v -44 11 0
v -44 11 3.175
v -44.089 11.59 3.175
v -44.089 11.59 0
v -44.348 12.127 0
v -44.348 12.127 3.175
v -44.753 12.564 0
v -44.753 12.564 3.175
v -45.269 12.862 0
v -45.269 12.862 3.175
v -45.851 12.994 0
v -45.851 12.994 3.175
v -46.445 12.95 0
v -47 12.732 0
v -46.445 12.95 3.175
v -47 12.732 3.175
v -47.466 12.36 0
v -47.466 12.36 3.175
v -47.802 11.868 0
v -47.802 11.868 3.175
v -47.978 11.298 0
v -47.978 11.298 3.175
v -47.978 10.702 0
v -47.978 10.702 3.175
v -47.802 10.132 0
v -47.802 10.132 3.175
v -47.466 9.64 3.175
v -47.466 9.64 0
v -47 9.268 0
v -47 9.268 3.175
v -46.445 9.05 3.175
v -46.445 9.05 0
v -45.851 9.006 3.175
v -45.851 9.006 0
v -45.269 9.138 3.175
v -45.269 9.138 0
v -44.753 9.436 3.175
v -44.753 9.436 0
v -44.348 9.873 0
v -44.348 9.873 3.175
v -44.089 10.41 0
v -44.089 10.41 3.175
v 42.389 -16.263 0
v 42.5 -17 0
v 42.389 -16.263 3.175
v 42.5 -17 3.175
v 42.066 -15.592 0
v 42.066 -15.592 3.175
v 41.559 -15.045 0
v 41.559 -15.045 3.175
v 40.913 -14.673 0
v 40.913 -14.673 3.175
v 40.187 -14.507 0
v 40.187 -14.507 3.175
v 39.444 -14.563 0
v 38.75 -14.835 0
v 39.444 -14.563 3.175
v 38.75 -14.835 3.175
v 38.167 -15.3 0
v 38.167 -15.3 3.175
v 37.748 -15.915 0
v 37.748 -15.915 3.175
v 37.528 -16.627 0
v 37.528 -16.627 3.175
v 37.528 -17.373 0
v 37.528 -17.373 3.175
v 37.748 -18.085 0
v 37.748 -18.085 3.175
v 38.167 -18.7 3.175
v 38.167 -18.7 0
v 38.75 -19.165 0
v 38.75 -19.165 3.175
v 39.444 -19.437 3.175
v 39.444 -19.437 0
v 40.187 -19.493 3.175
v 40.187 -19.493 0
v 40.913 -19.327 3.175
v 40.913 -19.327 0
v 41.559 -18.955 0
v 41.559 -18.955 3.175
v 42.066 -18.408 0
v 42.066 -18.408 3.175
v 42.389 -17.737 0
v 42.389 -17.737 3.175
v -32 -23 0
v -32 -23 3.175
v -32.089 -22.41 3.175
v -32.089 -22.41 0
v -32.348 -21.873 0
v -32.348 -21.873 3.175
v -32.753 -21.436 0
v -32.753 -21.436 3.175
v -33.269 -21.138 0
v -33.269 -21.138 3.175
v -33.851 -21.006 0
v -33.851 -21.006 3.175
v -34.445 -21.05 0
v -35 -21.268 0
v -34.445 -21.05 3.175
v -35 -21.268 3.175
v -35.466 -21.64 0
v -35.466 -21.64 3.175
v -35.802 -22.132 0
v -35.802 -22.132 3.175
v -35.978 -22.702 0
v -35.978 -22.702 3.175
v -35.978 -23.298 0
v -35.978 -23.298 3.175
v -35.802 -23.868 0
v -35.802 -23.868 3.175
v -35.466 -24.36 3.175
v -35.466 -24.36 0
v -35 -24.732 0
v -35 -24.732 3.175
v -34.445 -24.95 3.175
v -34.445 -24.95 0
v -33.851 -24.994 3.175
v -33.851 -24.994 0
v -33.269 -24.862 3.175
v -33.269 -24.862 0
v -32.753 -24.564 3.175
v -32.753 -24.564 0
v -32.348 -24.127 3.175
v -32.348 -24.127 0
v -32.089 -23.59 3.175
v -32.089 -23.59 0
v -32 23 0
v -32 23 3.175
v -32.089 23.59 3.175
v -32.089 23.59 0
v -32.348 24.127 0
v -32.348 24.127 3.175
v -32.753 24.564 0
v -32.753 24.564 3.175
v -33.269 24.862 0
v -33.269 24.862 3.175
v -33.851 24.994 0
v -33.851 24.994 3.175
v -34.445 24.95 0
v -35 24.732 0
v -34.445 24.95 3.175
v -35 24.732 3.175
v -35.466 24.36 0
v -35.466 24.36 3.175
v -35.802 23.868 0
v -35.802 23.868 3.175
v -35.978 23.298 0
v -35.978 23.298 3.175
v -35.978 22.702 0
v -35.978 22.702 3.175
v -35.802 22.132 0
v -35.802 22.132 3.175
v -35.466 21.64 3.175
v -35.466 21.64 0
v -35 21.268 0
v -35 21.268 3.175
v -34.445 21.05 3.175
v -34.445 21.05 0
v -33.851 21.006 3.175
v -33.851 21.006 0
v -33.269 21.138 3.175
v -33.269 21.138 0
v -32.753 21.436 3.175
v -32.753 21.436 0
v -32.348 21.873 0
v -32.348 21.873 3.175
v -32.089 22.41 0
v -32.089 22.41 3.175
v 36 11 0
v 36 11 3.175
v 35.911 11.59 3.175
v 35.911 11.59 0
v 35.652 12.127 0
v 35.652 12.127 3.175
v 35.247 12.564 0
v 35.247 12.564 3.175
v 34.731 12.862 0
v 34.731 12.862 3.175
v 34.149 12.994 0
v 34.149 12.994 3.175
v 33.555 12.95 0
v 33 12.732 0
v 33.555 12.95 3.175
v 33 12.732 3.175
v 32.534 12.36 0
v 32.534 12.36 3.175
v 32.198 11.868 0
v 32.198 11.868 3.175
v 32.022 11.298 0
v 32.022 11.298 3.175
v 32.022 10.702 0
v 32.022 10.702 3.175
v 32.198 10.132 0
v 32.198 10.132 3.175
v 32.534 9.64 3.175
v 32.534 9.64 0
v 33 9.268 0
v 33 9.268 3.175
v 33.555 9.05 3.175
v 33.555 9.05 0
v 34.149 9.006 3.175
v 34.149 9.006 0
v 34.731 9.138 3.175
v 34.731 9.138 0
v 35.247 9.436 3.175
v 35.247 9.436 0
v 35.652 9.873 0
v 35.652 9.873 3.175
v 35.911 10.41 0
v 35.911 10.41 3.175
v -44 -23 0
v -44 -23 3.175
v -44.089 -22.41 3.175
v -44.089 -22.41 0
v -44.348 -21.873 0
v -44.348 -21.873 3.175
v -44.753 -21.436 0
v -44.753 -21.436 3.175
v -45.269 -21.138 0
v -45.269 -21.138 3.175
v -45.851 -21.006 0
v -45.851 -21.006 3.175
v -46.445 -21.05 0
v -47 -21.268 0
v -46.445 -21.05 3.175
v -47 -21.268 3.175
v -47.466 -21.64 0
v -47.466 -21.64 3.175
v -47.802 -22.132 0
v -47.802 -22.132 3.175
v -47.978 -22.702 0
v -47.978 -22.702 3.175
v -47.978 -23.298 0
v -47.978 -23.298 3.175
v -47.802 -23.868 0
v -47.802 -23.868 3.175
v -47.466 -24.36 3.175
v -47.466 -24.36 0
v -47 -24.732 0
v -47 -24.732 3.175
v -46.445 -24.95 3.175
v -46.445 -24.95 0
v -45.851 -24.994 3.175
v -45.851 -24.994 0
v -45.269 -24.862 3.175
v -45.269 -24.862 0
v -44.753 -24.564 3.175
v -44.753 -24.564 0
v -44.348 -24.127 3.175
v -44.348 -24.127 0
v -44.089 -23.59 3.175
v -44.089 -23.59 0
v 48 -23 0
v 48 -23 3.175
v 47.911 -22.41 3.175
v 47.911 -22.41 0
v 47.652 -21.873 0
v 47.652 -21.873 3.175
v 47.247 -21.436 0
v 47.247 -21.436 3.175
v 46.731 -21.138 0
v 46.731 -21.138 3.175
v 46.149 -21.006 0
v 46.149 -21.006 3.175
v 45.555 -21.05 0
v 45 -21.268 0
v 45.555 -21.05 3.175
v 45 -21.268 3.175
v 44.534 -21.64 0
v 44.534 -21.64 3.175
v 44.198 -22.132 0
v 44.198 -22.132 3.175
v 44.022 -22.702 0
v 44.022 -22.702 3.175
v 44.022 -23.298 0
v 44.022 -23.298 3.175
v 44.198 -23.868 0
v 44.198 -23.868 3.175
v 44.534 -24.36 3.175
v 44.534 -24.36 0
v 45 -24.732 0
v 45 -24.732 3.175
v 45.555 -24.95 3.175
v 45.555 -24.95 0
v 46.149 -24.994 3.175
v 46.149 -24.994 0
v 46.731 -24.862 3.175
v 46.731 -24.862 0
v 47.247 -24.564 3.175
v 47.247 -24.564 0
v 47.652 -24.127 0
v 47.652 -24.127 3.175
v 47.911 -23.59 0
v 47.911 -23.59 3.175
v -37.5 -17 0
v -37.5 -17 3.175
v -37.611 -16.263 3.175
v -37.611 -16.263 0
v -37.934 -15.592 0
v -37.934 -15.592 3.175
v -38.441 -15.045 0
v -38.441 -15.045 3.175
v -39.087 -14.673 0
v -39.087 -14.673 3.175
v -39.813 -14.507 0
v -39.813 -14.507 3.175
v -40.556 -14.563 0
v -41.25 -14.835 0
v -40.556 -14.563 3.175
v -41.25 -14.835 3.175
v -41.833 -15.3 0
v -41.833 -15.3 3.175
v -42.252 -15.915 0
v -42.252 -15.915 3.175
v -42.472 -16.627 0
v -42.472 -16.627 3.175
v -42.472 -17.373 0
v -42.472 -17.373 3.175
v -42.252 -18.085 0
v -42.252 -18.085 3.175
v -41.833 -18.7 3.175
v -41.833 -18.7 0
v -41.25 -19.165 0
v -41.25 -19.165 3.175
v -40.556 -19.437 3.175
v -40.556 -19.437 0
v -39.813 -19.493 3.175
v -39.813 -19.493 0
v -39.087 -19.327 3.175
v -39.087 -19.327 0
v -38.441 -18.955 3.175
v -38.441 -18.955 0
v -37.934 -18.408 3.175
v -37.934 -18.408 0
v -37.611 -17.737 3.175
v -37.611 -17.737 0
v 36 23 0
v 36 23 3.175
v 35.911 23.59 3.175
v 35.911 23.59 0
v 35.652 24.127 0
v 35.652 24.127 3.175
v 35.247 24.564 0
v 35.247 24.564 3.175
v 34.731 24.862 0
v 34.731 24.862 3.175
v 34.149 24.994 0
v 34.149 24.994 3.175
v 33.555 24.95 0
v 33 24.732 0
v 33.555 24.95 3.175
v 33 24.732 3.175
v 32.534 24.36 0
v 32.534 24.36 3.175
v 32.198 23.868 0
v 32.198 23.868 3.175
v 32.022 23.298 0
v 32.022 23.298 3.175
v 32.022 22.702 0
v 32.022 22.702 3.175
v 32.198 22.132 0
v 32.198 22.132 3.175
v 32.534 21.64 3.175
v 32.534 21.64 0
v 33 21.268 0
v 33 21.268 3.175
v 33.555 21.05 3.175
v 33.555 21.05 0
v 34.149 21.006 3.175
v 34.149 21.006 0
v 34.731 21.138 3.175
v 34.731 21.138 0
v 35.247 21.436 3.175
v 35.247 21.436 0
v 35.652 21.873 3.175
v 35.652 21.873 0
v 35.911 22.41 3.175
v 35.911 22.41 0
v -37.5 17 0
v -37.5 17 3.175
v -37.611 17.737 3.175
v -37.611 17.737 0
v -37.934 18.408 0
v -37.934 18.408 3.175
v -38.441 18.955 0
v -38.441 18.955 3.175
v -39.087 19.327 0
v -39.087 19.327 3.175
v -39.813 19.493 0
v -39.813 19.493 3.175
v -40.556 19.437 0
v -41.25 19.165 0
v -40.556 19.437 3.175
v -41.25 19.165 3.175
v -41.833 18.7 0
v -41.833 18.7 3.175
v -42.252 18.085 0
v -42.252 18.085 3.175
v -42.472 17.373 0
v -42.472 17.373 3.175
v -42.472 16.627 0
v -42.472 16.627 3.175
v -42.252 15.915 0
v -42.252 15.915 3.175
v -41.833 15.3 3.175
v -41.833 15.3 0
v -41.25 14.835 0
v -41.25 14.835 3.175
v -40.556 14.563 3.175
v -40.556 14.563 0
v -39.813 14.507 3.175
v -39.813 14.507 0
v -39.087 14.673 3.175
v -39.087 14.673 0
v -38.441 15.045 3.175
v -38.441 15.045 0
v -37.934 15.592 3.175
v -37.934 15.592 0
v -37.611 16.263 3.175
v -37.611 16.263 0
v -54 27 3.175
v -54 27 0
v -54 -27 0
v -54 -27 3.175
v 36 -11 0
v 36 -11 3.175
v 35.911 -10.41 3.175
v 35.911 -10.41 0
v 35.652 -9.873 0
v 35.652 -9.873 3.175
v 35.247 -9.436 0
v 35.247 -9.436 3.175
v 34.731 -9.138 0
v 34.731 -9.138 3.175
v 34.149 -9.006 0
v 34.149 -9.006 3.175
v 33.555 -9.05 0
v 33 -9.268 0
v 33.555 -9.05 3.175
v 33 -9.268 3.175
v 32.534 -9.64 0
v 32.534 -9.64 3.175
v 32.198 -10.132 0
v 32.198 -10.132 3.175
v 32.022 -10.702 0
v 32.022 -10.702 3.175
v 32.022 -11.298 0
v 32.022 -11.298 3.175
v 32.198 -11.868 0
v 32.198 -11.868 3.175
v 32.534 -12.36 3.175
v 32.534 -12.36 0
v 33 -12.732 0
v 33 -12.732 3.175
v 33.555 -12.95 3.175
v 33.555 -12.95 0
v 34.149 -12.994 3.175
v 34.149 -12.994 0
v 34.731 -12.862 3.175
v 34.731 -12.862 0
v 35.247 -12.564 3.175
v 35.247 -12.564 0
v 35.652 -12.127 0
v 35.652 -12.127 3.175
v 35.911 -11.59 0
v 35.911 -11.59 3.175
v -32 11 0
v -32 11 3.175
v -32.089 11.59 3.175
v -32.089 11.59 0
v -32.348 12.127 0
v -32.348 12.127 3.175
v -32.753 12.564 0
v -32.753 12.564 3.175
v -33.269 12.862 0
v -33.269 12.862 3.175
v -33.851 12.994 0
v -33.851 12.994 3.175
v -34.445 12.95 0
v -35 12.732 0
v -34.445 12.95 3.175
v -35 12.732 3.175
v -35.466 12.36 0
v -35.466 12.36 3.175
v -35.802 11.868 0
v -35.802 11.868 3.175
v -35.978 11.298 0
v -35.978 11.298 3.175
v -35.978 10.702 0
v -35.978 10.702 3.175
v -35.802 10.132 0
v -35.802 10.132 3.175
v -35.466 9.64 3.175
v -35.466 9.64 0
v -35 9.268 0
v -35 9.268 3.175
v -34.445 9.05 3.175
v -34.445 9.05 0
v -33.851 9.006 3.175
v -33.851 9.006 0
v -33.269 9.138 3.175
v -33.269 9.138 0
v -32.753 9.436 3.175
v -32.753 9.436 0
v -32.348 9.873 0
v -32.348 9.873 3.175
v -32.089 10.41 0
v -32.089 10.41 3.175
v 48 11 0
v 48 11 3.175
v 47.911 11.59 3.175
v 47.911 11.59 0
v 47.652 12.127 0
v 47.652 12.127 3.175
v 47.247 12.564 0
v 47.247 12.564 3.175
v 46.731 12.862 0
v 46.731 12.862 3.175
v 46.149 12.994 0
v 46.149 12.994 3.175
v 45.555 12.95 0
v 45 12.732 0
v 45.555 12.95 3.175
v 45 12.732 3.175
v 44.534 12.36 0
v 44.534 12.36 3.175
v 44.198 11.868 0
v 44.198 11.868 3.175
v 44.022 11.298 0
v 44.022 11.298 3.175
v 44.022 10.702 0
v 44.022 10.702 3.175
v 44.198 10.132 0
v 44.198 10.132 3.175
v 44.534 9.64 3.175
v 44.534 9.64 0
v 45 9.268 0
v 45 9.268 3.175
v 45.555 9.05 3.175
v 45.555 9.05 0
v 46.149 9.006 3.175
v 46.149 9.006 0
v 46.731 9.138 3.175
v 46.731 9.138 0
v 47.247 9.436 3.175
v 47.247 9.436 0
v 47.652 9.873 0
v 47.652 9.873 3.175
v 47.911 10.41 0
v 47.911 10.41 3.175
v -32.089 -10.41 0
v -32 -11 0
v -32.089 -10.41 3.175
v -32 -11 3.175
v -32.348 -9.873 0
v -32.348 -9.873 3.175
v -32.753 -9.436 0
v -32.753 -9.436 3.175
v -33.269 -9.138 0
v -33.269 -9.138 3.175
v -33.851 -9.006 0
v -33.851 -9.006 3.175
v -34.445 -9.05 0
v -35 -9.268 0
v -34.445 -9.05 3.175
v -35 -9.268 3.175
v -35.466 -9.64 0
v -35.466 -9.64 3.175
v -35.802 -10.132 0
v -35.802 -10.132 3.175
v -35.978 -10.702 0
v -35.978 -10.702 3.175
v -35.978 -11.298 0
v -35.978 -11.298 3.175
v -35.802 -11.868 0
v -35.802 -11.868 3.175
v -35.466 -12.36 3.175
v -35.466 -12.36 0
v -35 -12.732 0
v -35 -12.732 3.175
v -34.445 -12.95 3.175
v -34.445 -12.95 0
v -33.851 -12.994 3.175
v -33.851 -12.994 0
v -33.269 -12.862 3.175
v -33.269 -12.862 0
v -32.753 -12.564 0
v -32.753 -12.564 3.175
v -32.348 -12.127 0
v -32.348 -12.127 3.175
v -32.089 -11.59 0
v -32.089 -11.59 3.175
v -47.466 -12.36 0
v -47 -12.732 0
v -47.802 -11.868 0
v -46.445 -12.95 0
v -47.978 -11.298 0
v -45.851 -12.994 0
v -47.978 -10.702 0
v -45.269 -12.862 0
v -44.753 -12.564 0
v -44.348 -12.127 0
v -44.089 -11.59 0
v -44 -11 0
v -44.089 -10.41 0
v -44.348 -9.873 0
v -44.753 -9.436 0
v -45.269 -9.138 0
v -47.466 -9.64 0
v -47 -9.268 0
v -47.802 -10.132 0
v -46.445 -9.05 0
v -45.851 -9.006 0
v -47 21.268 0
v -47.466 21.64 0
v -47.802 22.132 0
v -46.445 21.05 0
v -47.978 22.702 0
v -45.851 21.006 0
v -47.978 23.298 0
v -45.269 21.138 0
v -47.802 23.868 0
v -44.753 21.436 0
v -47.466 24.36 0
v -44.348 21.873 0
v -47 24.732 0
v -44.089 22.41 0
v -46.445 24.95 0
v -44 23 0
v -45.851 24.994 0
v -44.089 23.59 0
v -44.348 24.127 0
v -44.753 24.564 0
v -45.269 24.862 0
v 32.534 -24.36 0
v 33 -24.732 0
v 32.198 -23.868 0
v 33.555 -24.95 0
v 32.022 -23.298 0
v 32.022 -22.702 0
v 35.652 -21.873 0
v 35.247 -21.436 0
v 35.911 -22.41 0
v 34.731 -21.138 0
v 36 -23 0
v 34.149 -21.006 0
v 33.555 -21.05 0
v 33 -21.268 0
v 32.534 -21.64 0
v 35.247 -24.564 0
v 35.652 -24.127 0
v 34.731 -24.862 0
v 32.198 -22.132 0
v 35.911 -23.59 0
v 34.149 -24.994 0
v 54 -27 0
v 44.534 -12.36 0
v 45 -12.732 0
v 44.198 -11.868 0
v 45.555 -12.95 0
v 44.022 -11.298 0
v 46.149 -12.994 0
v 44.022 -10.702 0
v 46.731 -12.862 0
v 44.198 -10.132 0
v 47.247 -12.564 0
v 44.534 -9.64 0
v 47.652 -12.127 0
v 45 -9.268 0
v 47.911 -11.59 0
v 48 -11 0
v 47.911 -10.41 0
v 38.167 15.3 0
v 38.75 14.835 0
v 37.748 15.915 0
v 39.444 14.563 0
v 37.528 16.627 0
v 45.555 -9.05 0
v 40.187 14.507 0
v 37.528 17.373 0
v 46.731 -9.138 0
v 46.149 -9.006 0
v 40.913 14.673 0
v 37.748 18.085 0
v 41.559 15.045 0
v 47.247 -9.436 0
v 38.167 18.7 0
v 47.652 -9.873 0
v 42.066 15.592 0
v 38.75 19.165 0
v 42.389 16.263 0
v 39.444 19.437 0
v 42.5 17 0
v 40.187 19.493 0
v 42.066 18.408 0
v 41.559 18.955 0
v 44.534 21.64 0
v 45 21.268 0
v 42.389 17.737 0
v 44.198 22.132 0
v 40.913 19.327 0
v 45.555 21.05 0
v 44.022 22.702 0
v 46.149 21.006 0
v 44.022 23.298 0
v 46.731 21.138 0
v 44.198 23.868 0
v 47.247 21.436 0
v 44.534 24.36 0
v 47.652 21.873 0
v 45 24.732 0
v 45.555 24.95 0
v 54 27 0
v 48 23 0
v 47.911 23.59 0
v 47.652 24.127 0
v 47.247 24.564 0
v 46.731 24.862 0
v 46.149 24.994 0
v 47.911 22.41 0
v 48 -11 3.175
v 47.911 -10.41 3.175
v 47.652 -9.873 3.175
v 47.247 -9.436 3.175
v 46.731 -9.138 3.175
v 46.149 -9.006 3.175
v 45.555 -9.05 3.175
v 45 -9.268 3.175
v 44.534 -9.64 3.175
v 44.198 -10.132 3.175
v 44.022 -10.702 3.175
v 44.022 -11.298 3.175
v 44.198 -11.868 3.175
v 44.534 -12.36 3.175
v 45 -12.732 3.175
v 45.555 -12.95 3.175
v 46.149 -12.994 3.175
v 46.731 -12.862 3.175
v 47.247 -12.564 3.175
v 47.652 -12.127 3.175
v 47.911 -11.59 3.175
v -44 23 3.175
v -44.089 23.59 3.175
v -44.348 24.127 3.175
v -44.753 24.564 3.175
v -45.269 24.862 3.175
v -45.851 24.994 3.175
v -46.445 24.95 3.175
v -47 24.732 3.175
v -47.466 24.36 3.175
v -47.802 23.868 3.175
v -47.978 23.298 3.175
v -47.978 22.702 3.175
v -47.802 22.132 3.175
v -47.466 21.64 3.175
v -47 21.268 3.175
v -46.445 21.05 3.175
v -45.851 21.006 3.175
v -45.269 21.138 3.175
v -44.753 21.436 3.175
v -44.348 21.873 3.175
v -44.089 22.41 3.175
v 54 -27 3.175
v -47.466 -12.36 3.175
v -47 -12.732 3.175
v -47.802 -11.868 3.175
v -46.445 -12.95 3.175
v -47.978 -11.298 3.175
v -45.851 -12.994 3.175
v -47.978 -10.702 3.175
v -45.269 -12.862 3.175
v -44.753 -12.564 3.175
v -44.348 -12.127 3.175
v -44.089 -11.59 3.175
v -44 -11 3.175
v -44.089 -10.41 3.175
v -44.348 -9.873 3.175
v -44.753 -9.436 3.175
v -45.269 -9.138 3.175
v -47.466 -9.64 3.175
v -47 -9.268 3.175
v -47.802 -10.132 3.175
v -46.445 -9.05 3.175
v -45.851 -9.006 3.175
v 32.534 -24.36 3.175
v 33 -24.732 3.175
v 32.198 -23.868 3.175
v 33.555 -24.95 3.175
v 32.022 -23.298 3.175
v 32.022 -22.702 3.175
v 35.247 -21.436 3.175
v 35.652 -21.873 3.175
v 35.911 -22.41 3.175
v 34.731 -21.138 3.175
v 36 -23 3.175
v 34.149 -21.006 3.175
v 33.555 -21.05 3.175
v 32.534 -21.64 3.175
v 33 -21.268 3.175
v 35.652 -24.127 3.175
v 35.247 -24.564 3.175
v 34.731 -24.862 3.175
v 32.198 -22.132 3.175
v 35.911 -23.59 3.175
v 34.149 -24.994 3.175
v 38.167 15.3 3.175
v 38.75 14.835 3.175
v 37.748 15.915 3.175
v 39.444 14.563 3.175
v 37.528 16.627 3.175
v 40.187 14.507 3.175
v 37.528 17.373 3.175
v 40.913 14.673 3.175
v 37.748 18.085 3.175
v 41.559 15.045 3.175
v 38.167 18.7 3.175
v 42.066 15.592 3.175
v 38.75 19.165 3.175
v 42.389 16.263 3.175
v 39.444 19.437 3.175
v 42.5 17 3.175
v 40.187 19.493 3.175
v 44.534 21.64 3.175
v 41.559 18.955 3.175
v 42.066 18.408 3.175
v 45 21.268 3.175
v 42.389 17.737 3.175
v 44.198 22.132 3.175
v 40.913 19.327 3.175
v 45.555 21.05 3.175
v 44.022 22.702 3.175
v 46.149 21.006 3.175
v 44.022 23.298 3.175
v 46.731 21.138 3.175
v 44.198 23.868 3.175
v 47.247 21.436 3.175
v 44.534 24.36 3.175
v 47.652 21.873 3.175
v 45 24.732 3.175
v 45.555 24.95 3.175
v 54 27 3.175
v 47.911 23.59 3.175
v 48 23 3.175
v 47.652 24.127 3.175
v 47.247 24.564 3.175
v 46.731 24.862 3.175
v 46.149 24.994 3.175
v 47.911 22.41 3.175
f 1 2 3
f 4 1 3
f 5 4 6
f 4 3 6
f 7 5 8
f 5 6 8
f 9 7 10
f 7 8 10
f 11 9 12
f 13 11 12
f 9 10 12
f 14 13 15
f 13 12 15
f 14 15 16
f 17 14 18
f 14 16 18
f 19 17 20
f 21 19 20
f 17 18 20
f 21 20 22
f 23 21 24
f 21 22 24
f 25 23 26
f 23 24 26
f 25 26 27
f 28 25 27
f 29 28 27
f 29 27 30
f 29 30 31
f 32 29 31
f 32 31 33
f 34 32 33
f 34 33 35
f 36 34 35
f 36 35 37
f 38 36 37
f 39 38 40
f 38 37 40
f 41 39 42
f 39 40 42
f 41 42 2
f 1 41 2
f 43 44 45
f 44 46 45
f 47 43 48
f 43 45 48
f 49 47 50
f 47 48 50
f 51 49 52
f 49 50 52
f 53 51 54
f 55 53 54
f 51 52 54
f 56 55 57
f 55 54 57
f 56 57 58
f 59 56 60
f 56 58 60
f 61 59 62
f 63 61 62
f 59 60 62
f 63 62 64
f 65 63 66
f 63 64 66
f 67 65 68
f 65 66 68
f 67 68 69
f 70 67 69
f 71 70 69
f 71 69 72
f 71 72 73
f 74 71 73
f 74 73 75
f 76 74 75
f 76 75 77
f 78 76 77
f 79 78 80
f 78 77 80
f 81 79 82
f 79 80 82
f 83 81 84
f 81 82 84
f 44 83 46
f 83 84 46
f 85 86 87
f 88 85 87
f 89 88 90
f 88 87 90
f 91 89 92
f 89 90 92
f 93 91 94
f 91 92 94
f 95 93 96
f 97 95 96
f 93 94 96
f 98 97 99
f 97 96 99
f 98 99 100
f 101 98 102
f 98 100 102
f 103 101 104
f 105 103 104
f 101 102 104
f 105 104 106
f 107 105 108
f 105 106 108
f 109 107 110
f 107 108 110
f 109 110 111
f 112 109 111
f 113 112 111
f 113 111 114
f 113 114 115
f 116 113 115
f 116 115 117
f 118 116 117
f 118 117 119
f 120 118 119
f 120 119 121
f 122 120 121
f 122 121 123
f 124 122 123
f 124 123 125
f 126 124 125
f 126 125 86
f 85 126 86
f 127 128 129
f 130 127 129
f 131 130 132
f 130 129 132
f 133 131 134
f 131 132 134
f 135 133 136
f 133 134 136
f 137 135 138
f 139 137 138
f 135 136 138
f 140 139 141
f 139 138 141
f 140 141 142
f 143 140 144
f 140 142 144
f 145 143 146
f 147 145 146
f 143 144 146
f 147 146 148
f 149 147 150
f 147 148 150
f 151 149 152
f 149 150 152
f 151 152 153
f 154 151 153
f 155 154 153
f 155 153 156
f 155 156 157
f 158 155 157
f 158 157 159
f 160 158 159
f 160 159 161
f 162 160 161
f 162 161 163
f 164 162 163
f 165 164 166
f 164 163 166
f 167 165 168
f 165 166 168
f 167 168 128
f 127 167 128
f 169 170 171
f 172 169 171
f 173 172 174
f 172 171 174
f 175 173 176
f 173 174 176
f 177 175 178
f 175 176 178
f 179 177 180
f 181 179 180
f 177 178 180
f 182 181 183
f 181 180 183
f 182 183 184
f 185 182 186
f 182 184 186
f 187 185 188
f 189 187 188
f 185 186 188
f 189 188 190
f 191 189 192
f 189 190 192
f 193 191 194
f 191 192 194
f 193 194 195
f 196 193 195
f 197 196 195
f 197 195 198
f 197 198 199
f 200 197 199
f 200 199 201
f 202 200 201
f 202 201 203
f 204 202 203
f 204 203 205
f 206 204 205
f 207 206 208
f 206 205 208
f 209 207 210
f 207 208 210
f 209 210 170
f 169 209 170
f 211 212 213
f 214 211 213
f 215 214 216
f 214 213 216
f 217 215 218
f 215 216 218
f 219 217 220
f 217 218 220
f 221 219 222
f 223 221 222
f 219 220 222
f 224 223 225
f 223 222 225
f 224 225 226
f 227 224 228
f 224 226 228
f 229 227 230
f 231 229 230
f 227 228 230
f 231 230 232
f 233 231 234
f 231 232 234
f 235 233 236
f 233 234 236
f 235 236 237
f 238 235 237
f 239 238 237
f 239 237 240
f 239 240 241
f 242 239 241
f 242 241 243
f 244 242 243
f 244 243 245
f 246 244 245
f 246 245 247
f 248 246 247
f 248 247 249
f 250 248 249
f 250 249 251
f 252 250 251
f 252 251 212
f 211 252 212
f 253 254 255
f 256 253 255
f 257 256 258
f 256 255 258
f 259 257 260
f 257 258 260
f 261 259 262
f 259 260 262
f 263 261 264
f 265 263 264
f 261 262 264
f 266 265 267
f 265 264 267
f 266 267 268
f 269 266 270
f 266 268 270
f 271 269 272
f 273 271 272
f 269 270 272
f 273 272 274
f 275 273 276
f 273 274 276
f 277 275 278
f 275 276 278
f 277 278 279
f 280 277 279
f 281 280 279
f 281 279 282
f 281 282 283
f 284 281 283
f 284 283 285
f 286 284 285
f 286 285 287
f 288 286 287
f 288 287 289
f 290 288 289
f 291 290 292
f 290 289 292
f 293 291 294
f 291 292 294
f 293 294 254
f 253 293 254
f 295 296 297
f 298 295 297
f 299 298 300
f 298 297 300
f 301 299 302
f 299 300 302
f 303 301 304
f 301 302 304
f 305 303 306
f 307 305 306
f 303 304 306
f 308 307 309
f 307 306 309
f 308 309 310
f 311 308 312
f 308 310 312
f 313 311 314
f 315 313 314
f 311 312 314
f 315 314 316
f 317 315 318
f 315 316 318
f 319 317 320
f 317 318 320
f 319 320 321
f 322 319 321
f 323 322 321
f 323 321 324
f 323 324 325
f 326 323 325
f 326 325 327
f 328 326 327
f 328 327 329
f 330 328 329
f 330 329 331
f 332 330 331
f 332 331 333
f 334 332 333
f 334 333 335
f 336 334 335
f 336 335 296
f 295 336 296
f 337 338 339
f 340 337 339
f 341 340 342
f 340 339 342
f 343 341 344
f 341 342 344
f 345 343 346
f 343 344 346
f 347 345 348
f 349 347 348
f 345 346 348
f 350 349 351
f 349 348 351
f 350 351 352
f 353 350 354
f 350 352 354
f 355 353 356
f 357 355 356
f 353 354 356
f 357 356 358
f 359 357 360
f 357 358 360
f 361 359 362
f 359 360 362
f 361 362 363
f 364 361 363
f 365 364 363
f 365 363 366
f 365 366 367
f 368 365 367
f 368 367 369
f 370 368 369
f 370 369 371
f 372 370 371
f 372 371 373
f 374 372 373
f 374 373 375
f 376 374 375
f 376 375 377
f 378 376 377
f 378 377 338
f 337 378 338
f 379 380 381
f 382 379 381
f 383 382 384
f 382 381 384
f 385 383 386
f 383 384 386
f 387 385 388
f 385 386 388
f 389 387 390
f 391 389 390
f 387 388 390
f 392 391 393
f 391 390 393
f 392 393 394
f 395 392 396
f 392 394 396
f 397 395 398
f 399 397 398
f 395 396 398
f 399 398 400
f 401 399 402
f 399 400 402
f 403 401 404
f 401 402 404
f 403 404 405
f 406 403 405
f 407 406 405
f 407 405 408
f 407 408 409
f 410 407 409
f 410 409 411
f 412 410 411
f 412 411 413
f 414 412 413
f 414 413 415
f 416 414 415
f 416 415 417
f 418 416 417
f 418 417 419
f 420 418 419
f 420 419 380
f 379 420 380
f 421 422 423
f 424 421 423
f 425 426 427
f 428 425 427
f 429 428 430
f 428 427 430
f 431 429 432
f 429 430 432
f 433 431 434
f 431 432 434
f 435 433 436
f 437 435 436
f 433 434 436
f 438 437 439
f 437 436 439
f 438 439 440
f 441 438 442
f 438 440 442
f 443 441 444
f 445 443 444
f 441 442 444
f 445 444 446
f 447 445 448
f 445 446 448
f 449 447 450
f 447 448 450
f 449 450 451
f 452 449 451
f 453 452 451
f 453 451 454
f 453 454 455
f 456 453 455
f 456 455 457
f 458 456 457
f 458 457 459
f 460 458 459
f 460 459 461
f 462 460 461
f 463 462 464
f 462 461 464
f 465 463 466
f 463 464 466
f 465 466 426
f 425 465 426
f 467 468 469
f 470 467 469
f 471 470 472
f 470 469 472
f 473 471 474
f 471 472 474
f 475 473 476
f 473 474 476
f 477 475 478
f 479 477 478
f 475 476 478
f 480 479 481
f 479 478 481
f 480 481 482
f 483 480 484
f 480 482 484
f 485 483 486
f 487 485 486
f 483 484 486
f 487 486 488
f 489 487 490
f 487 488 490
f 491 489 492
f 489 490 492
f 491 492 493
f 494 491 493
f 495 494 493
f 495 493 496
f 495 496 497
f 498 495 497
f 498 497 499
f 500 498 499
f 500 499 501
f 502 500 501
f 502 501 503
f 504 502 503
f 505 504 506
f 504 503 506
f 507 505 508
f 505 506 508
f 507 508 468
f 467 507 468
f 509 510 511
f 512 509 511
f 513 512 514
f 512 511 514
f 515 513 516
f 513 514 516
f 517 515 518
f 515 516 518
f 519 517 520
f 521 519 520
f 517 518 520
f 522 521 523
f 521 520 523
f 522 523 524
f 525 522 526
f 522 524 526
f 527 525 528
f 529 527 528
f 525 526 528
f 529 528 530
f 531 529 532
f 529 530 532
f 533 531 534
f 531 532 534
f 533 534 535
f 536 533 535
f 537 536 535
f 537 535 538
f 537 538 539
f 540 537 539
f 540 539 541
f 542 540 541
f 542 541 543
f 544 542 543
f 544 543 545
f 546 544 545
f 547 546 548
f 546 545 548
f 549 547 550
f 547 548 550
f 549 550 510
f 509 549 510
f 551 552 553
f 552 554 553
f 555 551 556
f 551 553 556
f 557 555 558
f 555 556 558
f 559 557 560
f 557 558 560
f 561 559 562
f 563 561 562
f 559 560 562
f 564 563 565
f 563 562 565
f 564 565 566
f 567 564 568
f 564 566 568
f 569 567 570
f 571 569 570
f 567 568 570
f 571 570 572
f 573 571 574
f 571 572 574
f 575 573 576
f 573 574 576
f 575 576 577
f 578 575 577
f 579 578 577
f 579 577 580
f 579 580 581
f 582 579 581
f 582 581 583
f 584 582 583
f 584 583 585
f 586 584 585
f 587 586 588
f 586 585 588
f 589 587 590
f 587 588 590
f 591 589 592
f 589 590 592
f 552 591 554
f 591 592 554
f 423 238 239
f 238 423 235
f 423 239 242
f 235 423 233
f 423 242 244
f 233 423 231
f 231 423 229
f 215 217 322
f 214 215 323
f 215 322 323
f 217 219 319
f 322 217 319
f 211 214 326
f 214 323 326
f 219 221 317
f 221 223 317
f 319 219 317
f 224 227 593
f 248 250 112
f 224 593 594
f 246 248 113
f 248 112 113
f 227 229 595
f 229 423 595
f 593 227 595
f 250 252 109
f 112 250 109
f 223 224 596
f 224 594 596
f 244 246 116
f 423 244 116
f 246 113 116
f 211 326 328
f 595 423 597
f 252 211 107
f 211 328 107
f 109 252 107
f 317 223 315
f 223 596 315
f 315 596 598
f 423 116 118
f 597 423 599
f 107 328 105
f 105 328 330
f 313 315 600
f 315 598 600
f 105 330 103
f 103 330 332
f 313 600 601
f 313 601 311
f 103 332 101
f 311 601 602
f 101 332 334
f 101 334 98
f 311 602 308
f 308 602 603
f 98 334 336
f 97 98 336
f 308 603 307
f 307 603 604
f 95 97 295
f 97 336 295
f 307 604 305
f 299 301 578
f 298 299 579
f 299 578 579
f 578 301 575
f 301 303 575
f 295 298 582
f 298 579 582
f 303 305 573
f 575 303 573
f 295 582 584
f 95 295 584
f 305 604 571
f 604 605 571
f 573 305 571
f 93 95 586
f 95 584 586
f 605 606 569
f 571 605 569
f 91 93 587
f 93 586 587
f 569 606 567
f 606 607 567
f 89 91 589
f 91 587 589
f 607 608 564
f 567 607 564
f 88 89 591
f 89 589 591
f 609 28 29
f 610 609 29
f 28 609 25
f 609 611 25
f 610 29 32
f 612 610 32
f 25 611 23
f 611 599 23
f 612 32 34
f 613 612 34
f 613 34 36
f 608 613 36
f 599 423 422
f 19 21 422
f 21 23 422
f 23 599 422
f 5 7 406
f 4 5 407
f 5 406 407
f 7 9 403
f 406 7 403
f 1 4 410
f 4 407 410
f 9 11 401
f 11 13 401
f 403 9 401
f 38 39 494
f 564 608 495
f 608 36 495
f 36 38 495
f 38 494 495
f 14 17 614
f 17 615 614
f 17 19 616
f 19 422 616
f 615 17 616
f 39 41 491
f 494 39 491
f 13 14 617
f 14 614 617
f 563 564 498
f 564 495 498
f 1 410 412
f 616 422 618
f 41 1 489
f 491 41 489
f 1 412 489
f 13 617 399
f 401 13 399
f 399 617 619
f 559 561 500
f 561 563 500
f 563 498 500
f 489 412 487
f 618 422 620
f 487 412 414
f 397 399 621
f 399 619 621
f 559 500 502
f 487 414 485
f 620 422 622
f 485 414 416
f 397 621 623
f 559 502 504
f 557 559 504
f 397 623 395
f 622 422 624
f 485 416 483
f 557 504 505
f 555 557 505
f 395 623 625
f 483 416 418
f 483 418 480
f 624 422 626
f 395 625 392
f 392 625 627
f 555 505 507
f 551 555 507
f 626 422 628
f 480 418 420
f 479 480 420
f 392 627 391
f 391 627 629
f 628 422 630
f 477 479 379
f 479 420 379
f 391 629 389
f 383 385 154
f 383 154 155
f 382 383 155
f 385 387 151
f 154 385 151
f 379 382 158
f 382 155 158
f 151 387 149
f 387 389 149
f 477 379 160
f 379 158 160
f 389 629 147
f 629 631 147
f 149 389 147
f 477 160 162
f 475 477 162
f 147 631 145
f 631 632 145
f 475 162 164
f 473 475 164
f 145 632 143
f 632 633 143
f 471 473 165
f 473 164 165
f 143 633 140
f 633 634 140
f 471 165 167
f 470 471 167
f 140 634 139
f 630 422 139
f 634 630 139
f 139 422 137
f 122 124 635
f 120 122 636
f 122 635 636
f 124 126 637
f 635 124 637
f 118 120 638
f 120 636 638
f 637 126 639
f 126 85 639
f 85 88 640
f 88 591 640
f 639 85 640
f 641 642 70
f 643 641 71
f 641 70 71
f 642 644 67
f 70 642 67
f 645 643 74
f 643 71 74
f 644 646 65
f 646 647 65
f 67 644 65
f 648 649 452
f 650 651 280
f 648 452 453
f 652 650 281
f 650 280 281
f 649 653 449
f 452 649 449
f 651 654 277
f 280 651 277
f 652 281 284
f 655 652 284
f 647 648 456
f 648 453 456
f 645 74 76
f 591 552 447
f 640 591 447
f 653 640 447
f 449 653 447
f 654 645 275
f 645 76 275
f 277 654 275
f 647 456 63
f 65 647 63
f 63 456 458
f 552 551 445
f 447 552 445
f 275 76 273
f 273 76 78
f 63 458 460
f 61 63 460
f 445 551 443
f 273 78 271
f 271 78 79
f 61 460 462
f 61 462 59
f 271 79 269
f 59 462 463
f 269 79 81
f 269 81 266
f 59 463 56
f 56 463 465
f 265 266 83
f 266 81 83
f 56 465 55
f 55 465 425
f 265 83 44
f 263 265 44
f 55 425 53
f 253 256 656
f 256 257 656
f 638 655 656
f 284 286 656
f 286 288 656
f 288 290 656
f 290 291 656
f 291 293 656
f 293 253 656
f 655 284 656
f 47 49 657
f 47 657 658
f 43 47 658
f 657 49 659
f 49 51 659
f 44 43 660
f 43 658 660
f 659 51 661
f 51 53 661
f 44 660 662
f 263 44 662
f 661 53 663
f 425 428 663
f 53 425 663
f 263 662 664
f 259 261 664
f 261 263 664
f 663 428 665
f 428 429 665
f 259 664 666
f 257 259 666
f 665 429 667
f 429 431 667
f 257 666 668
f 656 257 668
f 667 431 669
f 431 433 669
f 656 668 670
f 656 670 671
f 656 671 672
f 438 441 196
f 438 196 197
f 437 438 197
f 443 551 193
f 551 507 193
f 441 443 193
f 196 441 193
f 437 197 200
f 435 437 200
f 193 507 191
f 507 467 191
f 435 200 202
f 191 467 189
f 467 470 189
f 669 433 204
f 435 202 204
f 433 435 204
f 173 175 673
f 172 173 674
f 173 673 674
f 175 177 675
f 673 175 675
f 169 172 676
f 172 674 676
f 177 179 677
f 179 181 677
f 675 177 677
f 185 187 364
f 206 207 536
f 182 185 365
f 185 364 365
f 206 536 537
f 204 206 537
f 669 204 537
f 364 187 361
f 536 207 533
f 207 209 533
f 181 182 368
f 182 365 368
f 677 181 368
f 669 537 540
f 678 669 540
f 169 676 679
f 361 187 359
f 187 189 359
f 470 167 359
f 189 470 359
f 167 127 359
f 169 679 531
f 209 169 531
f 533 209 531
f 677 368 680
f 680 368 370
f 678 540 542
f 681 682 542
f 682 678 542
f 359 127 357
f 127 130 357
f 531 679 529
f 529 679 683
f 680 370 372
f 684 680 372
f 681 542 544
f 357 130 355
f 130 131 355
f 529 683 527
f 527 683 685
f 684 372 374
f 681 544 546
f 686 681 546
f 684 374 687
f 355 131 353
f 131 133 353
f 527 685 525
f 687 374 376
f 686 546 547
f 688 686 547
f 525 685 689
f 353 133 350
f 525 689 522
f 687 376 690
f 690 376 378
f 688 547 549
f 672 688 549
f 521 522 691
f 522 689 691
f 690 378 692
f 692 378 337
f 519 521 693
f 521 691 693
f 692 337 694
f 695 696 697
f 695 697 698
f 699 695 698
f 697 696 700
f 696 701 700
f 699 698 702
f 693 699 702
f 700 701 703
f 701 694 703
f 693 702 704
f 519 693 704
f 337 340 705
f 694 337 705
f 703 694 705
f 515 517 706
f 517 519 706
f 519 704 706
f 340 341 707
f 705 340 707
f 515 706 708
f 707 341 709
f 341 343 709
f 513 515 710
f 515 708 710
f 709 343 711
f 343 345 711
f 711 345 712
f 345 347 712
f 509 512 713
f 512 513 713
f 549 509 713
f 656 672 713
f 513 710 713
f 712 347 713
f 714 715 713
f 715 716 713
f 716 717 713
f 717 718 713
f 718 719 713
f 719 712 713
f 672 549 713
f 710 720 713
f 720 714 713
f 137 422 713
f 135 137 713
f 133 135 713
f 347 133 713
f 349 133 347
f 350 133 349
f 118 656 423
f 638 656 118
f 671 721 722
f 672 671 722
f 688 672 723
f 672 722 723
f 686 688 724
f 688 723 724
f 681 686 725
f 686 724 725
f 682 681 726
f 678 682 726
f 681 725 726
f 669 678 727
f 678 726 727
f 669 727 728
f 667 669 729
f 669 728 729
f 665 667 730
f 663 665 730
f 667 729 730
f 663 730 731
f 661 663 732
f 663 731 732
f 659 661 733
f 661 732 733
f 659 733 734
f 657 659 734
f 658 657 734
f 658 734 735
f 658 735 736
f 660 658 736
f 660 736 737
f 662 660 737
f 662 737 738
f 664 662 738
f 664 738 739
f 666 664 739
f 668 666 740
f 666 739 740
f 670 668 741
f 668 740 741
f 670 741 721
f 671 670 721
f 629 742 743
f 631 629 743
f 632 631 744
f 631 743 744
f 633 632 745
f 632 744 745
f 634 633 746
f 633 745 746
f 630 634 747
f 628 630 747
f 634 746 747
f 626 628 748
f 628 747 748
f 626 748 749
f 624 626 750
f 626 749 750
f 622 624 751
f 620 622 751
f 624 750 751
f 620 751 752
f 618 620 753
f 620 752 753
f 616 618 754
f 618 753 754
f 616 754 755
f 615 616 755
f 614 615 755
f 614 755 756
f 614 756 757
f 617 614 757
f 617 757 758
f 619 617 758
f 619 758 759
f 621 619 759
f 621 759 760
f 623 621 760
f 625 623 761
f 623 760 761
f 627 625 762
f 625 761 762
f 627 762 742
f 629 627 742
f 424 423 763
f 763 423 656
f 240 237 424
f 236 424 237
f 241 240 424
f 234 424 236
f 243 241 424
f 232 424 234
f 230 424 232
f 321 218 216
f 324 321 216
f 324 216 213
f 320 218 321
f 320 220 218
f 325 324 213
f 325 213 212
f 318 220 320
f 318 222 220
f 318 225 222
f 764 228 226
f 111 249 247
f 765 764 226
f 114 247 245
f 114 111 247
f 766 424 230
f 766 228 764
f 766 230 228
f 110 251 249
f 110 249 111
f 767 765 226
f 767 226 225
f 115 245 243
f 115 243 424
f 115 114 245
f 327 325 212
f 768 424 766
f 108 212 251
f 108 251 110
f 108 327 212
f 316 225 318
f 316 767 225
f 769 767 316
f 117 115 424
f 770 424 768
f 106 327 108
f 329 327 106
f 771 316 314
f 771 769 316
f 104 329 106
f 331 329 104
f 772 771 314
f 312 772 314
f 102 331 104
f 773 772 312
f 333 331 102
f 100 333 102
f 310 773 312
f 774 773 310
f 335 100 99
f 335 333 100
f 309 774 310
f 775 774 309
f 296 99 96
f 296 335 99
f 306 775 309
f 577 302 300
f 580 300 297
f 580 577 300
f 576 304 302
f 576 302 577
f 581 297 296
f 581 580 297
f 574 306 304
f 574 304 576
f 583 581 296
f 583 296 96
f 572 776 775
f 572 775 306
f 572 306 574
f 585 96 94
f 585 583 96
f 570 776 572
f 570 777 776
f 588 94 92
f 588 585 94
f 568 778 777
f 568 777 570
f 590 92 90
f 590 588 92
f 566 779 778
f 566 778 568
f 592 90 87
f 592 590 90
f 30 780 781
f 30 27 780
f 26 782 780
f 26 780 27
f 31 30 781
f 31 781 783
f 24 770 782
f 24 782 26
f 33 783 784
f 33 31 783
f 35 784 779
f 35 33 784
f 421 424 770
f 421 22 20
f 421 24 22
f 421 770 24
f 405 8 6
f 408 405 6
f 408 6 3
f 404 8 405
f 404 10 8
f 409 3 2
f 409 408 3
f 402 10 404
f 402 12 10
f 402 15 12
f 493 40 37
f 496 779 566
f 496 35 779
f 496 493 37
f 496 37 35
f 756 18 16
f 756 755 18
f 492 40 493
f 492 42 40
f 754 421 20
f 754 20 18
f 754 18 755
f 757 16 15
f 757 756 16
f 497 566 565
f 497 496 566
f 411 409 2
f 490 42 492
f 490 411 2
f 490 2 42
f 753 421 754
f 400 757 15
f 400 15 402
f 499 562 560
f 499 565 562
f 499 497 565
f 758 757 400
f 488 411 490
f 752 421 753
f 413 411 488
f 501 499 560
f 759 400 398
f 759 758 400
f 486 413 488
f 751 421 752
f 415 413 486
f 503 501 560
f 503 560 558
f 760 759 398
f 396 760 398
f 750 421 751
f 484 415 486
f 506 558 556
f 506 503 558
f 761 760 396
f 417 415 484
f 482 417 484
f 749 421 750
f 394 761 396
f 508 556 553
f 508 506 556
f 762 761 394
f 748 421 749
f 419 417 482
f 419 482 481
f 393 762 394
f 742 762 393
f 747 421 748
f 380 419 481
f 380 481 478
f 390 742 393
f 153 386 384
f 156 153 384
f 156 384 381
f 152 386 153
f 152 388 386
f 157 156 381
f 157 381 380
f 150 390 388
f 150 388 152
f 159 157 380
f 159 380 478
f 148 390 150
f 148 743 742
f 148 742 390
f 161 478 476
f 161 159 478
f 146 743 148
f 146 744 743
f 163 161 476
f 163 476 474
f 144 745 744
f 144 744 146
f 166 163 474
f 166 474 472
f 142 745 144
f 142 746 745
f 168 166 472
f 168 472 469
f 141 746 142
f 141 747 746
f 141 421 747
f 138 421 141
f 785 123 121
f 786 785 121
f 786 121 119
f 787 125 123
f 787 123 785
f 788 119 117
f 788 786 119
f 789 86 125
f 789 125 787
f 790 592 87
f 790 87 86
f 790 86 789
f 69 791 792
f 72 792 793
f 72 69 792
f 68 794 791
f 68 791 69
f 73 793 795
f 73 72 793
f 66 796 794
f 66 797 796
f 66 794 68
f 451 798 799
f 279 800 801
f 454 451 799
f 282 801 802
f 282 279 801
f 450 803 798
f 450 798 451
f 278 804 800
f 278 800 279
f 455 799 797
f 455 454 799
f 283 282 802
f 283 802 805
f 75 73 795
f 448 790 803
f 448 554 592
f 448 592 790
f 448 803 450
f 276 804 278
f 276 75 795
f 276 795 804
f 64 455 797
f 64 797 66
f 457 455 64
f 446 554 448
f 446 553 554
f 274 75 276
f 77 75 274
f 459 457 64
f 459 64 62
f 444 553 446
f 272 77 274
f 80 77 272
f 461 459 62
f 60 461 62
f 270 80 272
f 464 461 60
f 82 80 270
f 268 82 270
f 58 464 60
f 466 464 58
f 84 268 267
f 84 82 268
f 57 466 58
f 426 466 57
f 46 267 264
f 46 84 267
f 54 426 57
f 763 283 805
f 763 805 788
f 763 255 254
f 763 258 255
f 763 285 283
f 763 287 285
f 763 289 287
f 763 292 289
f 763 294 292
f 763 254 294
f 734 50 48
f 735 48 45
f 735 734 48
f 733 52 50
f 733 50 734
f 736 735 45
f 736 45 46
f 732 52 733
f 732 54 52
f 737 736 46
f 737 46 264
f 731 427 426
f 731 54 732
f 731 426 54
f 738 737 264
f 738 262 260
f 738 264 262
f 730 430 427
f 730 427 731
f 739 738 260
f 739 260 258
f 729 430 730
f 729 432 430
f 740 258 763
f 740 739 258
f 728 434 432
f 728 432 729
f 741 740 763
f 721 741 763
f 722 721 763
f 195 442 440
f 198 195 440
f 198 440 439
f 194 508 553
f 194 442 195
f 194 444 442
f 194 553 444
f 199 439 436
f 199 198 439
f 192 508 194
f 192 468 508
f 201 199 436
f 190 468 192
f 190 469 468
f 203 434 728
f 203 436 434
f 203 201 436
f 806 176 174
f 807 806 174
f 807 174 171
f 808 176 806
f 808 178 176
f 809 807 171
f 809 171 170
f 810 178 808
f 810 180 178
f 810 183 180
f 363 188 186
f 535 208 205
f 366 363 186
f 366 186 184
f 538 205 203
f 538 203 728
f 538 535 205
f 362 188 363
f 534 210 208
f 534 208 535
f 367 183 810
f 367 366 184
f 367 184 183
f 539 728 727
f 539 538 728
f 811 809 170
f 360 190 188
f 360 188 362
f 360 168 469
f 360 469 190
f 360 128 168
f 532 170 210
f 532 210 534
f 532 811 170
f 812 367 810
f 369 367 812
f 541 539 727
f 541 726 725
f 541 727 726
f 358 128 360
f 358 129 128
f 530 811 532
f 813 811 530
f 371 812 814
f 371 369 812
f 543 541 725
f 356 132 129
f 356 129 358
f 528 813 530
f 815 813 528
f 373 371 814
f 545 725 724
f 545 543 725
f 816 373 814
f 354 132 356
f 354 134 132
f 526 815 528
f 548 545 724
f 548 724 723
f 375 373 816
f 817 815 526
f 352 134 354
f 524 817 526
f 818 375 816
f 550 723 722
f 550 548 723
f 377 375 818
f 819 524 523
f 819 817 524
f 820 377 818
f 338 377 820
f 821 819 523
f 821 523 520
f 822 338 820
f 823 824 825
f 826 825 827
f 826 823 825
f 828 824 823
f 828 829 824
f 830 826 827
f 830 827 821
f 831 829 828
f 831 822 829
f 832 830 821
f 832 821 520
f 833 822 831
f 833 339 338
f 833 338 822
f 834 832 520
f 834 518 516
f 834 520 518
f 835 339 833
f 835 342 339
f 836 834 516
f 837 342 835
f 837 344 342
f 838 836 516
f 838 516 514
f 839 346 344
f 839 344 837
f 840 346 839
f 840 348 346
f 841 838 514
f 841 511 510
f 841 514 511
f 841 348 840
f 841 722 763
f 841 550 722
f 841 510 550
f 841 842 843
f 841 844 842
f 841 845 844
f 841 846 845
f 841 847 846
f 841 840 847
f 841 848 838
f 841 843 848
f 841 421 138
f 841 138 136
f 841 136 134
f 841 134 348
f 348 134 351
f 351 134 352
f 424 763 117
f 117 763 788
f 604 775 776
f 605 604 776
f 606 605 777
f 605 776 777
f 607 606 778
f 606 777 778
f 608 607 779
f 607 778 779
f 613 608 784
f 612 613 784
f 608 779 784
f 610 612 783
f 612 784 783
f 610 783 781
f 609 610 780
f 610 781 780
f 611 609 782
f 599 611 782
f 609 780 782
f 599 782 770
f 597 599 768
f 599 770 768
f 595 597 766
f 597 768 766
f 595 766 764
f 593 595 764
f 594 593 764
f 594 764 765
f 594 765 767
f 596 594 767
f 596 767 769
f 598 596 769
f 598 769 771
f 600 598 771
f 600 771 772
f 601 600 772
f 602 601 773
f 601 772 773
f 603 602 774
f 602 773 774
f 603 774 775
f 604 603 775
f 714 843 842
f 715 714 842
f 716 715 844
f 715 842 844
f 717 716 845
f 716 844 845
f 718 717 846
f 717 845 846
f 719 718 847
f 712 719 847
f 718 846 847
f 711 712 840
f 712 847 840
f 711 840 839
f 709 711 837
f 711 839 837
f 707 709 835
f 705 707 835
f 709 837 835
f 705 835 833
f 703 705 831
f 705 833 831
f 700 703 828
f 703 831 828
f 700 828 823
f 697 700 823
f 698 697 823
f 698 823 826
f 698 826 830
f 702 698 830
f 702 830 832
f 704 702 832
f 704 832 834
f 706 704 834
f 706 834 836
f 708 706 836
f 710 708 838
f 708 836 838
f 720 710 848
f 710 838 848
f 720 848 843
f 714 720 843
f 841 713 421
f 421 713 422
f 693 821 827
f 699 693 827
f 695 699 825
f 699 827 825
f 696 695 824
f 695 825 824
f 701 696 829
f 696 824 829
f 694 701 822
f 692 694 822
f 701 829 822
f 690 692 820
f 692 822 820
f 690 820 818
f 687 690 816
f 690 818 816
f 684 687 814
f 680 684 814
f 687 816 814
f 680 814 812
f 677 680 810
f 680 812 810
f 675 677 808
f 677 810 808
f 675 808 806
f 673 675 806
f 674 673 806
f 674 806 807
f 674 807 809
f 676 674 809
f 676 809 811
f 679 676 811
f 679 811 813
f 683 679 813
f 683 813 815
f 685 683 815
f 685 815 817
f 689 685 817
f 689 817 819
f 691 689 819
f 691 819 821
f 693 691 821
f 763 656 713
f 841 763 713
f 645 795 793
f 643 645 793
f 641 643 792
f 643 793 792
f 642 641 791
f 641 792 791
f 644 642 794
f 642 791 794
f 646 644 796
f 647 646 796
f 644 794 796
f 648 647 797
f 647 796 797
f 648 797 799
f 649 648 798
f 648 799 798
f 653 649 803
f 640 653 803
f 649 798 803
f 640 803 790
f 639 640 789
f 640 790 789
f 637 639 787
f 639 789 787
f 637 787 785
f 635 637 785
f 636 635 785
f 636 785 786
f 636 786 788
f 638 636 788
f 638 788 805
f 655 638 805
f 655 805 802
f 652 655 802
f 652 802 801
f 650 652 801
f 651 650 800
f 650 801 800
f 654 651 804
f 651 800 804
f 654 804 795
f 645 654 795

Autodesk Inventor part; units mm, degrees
ref_plane "YZ Plane" through (0, 0, 0) normal (1, 0, 0) x (0, 1, 0)
ref_plane "XZ Plane" through (0, 0, 0) normal (0, 1, 0) x (-1, 0, 0)
ref_plane "XY Plane" through (0, 0, 0) normal (0, 0, 1) x (1, 0, 0)
sketch "Sketch1" plane through (0, 0, 0) normal (0, 0, 1) x (1, 0, 0)
  line L0 (-54, -27) -> (54, -27)
  line L1 (54, -27) -> (54, 27)
  line L2 (54, 27) -> (-54, 27)
  line L3 (-54, 27) -> (-54, -27)
  line L4 (-54, -27) -> (54, 27) construction
  line L5 (54, -27) -> (-54, 27) construction
  point P0 (0, 0)
  dimension "d0" = 108
  dimension "d1" = 54
extrude "Extrusion1" add sketch "Sketch1" along normal blind 3.175
sketch "Sketch2" plane through (0, 0, 3.175) normal (0, 0, 1) x (1, 0, 0)
  line L0 (-54, -27) -> (54, -27) construction
  line L1 (54, -27) -> (54, 27) construction
  line L2 (54, 27) -> (-54, 27) construction
  line L3 (-54, 27) -> (-54, -27) construction
  line L4 (-54, -27) -> (54, -27) projected
  line L5 (0, 27) -> (0, -27) construction
  circle A0 centre (-40, -17) radius 2.5
  circle A1 centre (-46, -23) radius 2
  circle A2 centre (-34, -23) radius 2
  circle A3 centre (-34, -11) radius 2
  circle A4 centre (-46, -11) radius 2
  circle A5 centre (40, -17) radius 2.5
  circle A6 centre (46, -23) radius 2
  circle A7 centre (34, -23) radius 2
  circle A8 centre (34, -11) radius 2
  circle A9 centre (46, -11) radius 2
  line L6 (-54, 0) -> (54, 0) construction
  circle A10 centre (-40, 17) radius 2.5
  circle A11 centre (-46, 23) radius 2
  circle A12 centre (-34, 23) radius 2
  circle A13 centre (-34, 11) radius 2
  circle A14 centre (-46, 11) radius 2
  circle A15 centre (34, 11) radius 2
  circle A16 centre (34, 23) radius 2
  circle A17 centre (40, 17) radius 2.5
  circle A18 centre (46, 11) radius 2
  circle A19 centre (46, 23) radius 2
  point P0 (0, 0)
  point P1 (0, 0)
  point P2 (0, 0)
  dimension "d11" = 5
  dimension "d12" = 40
  dimension "d13" = 10
  dimension "d14" = 4
  dimension "d15" = 6
  dimension "d16" = 6
  dimension "d19" = 360
extrude "Extrusion2" cut sketch "Sketch2" against normal through all
properties part number "TurretMotorPlate"
